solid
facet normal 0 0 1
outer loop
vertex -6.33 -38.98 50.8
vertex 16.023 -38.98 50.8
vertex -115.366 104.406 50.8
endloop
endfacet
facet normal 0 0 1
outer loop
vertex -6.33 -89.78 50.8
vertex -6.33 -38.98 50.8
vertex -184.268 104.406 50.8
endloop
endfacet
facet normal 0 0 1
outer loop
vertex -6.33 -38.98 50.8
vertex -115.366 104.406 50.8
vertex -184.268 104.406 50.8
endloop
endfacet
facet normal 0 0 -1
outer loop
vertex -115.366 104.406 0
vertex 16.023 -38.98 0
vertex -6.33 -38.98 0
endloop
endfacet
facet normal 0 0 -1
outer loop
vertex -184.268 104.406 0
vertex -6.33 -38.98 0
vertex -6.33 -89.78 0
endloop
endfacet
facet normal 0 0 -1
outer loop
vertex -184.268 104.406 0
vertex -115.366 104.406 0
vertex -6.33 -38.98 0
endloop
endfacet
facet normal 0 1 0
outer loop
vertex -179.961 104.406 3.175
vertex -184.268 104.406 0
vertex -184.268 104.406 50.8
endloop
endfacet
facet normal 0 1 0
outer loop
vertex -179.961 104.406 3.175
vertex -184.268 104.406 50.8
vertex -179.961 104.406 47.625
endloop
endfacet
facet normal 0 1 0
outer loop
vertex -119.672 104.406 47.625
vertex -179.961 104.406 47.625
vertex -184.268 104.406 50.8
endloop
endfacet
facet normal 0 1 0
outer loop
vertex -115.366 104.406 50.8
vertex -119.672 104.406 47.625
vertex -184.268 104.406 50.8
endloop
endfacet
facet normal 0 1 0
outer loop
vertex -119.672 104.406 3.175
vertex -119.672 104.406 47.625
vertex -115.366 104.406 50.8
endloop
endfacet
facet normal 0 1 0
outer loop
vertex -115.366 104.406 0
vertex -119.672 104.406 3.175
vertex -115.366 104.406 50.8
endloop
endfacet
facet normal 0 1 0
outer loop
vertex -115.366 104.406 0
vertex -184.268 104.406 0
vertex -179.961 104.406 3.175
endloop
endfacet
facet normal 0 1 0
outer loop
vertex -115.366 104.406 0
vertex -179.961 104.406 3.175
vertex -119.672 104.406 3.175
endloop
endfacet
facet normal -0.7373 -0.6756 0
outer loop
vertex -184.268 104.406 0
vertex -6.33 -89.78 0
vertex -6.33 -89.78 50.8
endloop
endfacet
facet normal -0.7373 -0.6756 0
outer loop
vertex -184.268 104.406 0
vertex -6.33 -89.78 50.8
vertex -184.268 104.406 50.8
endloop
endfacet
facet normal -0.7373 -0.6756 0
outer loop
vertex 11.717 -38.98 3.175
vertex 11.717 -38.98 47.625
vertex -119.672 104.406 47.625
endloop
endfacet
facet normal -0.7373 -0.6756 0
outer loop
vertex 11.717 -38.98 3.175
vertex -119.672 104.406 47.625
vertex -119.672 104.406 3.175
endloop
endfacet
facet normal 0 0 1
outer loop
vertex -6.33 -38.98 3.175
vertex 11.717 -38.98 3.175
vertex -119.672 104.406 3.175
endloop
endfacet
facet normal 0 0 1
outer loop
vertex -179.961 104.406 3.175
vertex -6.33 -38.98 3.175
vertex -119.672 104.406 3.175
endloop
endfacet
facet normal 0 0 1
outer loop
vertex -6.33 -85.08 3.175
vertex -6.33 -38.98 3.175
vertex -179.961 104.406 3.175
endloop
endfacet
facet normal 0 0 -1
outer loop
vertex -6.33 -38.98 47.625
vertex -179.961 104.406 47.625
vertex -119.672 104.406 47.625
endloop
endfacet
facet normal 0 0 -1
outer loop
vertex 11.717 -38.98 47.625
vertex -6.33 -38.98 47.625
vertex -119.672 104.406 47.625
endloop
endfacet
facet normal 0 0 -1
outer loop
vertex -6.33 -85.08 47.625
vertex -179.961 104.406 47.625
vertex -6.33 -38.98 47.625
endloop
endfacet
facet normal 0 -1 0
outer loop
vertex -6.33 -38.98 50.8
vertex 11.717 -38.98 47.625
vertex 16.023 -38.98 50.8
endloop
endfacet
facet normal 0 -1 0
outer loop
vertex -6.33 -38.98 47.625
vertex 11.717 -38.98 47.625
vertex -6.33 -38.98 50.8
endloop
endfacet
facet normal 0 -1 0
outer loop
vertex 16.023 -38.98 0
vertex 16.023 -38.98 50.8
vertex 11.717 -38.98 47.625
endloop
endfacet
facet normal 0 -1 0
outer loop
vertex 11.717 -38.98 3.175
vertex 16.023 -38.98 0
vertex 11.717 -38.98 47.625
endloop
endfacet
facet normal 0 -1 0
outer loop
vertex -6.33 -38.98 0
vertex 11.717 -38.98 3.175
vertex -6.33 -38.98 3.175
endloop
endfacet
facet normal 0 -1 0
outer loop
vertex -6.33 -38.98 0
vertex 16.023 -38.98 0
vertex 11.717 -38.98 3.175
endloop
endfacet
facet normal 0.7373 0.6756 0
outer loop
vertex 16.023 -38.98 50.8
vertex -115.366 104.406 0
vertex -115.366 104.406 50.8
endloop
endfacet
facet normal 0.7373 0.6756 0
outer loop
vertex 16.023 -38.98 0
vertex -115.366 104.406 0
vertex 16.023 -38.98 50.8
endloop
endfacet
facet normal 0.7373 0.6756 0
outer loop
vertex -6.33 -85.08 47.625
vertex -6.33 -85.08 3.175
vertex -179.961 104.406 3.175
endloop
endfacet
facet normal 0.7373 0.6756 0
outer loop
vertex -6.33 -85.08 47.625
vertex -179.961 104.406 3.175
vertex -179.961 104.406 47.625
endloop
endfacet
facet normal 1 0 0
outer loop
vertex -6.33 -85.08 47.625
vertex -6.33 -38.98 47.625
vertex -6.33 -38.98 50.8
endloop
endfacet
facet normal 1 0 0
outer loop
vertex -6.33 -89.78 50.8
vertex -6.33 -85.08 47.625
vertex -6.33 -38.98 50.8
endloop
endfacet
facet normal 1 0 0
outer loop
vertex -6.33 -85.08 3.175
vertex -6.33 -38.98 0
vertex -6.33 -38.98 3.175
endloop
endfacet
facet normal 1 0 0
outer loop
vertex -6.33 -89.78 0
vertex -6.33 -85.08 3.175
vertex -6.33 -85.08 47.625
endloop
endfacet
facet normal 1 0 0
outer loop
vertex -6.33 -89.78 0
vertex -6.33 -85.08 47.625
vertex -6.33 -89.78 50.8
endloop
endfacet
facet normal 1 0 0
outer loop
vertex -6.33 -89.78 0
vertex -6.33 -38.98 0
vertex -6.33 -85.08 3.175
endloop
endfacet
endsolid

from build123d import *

# Parameters (mm, degrees)
BOSS_EXTRUDE1_DEPTH = 50.8
SKETCH14_W          = 60.289388783
SKETCH14_H          = 44.45


with BuildPart() as part:
    # Sketch1 → Boss-Extrude1 (new body)
    with BuildSketch(Plane.XY):
        Polygon((-6.329511048, -89.779515299), (-184.2678796, 104.406138968), (-115.365720991, 104.406138968), (16.023023921, -38.979515299), (-6.329511048, -38.979515299), align=None)
    extrude(amount=BOSS_EXTRUDE1_DEPTH)

    # Cut-Sweep1: sweep along a path in Sketch13
    with BuildLine(Plane.XY.offset(25.4)) as cut_sweep1_path:
        Line((-149.816800296, 104.406138968), (41.274977184, -104.133942279))
    # Sketch14 → Cut-Sweep1 (sweep, cut)
    with BuildSketch(Plane(origin=(0, 104.406138968, 0), x_dir=(1, 0, 0), z_dir=(0, 1, 0))):
        with Locations((-149.816800296, -25.4)):
            Rectangle(SKETCH14_W, SKETCH14_H)
    sweep(path=cut_sweep1_path.line, mode=Mode.SUBTRACT)


solid = part.part
